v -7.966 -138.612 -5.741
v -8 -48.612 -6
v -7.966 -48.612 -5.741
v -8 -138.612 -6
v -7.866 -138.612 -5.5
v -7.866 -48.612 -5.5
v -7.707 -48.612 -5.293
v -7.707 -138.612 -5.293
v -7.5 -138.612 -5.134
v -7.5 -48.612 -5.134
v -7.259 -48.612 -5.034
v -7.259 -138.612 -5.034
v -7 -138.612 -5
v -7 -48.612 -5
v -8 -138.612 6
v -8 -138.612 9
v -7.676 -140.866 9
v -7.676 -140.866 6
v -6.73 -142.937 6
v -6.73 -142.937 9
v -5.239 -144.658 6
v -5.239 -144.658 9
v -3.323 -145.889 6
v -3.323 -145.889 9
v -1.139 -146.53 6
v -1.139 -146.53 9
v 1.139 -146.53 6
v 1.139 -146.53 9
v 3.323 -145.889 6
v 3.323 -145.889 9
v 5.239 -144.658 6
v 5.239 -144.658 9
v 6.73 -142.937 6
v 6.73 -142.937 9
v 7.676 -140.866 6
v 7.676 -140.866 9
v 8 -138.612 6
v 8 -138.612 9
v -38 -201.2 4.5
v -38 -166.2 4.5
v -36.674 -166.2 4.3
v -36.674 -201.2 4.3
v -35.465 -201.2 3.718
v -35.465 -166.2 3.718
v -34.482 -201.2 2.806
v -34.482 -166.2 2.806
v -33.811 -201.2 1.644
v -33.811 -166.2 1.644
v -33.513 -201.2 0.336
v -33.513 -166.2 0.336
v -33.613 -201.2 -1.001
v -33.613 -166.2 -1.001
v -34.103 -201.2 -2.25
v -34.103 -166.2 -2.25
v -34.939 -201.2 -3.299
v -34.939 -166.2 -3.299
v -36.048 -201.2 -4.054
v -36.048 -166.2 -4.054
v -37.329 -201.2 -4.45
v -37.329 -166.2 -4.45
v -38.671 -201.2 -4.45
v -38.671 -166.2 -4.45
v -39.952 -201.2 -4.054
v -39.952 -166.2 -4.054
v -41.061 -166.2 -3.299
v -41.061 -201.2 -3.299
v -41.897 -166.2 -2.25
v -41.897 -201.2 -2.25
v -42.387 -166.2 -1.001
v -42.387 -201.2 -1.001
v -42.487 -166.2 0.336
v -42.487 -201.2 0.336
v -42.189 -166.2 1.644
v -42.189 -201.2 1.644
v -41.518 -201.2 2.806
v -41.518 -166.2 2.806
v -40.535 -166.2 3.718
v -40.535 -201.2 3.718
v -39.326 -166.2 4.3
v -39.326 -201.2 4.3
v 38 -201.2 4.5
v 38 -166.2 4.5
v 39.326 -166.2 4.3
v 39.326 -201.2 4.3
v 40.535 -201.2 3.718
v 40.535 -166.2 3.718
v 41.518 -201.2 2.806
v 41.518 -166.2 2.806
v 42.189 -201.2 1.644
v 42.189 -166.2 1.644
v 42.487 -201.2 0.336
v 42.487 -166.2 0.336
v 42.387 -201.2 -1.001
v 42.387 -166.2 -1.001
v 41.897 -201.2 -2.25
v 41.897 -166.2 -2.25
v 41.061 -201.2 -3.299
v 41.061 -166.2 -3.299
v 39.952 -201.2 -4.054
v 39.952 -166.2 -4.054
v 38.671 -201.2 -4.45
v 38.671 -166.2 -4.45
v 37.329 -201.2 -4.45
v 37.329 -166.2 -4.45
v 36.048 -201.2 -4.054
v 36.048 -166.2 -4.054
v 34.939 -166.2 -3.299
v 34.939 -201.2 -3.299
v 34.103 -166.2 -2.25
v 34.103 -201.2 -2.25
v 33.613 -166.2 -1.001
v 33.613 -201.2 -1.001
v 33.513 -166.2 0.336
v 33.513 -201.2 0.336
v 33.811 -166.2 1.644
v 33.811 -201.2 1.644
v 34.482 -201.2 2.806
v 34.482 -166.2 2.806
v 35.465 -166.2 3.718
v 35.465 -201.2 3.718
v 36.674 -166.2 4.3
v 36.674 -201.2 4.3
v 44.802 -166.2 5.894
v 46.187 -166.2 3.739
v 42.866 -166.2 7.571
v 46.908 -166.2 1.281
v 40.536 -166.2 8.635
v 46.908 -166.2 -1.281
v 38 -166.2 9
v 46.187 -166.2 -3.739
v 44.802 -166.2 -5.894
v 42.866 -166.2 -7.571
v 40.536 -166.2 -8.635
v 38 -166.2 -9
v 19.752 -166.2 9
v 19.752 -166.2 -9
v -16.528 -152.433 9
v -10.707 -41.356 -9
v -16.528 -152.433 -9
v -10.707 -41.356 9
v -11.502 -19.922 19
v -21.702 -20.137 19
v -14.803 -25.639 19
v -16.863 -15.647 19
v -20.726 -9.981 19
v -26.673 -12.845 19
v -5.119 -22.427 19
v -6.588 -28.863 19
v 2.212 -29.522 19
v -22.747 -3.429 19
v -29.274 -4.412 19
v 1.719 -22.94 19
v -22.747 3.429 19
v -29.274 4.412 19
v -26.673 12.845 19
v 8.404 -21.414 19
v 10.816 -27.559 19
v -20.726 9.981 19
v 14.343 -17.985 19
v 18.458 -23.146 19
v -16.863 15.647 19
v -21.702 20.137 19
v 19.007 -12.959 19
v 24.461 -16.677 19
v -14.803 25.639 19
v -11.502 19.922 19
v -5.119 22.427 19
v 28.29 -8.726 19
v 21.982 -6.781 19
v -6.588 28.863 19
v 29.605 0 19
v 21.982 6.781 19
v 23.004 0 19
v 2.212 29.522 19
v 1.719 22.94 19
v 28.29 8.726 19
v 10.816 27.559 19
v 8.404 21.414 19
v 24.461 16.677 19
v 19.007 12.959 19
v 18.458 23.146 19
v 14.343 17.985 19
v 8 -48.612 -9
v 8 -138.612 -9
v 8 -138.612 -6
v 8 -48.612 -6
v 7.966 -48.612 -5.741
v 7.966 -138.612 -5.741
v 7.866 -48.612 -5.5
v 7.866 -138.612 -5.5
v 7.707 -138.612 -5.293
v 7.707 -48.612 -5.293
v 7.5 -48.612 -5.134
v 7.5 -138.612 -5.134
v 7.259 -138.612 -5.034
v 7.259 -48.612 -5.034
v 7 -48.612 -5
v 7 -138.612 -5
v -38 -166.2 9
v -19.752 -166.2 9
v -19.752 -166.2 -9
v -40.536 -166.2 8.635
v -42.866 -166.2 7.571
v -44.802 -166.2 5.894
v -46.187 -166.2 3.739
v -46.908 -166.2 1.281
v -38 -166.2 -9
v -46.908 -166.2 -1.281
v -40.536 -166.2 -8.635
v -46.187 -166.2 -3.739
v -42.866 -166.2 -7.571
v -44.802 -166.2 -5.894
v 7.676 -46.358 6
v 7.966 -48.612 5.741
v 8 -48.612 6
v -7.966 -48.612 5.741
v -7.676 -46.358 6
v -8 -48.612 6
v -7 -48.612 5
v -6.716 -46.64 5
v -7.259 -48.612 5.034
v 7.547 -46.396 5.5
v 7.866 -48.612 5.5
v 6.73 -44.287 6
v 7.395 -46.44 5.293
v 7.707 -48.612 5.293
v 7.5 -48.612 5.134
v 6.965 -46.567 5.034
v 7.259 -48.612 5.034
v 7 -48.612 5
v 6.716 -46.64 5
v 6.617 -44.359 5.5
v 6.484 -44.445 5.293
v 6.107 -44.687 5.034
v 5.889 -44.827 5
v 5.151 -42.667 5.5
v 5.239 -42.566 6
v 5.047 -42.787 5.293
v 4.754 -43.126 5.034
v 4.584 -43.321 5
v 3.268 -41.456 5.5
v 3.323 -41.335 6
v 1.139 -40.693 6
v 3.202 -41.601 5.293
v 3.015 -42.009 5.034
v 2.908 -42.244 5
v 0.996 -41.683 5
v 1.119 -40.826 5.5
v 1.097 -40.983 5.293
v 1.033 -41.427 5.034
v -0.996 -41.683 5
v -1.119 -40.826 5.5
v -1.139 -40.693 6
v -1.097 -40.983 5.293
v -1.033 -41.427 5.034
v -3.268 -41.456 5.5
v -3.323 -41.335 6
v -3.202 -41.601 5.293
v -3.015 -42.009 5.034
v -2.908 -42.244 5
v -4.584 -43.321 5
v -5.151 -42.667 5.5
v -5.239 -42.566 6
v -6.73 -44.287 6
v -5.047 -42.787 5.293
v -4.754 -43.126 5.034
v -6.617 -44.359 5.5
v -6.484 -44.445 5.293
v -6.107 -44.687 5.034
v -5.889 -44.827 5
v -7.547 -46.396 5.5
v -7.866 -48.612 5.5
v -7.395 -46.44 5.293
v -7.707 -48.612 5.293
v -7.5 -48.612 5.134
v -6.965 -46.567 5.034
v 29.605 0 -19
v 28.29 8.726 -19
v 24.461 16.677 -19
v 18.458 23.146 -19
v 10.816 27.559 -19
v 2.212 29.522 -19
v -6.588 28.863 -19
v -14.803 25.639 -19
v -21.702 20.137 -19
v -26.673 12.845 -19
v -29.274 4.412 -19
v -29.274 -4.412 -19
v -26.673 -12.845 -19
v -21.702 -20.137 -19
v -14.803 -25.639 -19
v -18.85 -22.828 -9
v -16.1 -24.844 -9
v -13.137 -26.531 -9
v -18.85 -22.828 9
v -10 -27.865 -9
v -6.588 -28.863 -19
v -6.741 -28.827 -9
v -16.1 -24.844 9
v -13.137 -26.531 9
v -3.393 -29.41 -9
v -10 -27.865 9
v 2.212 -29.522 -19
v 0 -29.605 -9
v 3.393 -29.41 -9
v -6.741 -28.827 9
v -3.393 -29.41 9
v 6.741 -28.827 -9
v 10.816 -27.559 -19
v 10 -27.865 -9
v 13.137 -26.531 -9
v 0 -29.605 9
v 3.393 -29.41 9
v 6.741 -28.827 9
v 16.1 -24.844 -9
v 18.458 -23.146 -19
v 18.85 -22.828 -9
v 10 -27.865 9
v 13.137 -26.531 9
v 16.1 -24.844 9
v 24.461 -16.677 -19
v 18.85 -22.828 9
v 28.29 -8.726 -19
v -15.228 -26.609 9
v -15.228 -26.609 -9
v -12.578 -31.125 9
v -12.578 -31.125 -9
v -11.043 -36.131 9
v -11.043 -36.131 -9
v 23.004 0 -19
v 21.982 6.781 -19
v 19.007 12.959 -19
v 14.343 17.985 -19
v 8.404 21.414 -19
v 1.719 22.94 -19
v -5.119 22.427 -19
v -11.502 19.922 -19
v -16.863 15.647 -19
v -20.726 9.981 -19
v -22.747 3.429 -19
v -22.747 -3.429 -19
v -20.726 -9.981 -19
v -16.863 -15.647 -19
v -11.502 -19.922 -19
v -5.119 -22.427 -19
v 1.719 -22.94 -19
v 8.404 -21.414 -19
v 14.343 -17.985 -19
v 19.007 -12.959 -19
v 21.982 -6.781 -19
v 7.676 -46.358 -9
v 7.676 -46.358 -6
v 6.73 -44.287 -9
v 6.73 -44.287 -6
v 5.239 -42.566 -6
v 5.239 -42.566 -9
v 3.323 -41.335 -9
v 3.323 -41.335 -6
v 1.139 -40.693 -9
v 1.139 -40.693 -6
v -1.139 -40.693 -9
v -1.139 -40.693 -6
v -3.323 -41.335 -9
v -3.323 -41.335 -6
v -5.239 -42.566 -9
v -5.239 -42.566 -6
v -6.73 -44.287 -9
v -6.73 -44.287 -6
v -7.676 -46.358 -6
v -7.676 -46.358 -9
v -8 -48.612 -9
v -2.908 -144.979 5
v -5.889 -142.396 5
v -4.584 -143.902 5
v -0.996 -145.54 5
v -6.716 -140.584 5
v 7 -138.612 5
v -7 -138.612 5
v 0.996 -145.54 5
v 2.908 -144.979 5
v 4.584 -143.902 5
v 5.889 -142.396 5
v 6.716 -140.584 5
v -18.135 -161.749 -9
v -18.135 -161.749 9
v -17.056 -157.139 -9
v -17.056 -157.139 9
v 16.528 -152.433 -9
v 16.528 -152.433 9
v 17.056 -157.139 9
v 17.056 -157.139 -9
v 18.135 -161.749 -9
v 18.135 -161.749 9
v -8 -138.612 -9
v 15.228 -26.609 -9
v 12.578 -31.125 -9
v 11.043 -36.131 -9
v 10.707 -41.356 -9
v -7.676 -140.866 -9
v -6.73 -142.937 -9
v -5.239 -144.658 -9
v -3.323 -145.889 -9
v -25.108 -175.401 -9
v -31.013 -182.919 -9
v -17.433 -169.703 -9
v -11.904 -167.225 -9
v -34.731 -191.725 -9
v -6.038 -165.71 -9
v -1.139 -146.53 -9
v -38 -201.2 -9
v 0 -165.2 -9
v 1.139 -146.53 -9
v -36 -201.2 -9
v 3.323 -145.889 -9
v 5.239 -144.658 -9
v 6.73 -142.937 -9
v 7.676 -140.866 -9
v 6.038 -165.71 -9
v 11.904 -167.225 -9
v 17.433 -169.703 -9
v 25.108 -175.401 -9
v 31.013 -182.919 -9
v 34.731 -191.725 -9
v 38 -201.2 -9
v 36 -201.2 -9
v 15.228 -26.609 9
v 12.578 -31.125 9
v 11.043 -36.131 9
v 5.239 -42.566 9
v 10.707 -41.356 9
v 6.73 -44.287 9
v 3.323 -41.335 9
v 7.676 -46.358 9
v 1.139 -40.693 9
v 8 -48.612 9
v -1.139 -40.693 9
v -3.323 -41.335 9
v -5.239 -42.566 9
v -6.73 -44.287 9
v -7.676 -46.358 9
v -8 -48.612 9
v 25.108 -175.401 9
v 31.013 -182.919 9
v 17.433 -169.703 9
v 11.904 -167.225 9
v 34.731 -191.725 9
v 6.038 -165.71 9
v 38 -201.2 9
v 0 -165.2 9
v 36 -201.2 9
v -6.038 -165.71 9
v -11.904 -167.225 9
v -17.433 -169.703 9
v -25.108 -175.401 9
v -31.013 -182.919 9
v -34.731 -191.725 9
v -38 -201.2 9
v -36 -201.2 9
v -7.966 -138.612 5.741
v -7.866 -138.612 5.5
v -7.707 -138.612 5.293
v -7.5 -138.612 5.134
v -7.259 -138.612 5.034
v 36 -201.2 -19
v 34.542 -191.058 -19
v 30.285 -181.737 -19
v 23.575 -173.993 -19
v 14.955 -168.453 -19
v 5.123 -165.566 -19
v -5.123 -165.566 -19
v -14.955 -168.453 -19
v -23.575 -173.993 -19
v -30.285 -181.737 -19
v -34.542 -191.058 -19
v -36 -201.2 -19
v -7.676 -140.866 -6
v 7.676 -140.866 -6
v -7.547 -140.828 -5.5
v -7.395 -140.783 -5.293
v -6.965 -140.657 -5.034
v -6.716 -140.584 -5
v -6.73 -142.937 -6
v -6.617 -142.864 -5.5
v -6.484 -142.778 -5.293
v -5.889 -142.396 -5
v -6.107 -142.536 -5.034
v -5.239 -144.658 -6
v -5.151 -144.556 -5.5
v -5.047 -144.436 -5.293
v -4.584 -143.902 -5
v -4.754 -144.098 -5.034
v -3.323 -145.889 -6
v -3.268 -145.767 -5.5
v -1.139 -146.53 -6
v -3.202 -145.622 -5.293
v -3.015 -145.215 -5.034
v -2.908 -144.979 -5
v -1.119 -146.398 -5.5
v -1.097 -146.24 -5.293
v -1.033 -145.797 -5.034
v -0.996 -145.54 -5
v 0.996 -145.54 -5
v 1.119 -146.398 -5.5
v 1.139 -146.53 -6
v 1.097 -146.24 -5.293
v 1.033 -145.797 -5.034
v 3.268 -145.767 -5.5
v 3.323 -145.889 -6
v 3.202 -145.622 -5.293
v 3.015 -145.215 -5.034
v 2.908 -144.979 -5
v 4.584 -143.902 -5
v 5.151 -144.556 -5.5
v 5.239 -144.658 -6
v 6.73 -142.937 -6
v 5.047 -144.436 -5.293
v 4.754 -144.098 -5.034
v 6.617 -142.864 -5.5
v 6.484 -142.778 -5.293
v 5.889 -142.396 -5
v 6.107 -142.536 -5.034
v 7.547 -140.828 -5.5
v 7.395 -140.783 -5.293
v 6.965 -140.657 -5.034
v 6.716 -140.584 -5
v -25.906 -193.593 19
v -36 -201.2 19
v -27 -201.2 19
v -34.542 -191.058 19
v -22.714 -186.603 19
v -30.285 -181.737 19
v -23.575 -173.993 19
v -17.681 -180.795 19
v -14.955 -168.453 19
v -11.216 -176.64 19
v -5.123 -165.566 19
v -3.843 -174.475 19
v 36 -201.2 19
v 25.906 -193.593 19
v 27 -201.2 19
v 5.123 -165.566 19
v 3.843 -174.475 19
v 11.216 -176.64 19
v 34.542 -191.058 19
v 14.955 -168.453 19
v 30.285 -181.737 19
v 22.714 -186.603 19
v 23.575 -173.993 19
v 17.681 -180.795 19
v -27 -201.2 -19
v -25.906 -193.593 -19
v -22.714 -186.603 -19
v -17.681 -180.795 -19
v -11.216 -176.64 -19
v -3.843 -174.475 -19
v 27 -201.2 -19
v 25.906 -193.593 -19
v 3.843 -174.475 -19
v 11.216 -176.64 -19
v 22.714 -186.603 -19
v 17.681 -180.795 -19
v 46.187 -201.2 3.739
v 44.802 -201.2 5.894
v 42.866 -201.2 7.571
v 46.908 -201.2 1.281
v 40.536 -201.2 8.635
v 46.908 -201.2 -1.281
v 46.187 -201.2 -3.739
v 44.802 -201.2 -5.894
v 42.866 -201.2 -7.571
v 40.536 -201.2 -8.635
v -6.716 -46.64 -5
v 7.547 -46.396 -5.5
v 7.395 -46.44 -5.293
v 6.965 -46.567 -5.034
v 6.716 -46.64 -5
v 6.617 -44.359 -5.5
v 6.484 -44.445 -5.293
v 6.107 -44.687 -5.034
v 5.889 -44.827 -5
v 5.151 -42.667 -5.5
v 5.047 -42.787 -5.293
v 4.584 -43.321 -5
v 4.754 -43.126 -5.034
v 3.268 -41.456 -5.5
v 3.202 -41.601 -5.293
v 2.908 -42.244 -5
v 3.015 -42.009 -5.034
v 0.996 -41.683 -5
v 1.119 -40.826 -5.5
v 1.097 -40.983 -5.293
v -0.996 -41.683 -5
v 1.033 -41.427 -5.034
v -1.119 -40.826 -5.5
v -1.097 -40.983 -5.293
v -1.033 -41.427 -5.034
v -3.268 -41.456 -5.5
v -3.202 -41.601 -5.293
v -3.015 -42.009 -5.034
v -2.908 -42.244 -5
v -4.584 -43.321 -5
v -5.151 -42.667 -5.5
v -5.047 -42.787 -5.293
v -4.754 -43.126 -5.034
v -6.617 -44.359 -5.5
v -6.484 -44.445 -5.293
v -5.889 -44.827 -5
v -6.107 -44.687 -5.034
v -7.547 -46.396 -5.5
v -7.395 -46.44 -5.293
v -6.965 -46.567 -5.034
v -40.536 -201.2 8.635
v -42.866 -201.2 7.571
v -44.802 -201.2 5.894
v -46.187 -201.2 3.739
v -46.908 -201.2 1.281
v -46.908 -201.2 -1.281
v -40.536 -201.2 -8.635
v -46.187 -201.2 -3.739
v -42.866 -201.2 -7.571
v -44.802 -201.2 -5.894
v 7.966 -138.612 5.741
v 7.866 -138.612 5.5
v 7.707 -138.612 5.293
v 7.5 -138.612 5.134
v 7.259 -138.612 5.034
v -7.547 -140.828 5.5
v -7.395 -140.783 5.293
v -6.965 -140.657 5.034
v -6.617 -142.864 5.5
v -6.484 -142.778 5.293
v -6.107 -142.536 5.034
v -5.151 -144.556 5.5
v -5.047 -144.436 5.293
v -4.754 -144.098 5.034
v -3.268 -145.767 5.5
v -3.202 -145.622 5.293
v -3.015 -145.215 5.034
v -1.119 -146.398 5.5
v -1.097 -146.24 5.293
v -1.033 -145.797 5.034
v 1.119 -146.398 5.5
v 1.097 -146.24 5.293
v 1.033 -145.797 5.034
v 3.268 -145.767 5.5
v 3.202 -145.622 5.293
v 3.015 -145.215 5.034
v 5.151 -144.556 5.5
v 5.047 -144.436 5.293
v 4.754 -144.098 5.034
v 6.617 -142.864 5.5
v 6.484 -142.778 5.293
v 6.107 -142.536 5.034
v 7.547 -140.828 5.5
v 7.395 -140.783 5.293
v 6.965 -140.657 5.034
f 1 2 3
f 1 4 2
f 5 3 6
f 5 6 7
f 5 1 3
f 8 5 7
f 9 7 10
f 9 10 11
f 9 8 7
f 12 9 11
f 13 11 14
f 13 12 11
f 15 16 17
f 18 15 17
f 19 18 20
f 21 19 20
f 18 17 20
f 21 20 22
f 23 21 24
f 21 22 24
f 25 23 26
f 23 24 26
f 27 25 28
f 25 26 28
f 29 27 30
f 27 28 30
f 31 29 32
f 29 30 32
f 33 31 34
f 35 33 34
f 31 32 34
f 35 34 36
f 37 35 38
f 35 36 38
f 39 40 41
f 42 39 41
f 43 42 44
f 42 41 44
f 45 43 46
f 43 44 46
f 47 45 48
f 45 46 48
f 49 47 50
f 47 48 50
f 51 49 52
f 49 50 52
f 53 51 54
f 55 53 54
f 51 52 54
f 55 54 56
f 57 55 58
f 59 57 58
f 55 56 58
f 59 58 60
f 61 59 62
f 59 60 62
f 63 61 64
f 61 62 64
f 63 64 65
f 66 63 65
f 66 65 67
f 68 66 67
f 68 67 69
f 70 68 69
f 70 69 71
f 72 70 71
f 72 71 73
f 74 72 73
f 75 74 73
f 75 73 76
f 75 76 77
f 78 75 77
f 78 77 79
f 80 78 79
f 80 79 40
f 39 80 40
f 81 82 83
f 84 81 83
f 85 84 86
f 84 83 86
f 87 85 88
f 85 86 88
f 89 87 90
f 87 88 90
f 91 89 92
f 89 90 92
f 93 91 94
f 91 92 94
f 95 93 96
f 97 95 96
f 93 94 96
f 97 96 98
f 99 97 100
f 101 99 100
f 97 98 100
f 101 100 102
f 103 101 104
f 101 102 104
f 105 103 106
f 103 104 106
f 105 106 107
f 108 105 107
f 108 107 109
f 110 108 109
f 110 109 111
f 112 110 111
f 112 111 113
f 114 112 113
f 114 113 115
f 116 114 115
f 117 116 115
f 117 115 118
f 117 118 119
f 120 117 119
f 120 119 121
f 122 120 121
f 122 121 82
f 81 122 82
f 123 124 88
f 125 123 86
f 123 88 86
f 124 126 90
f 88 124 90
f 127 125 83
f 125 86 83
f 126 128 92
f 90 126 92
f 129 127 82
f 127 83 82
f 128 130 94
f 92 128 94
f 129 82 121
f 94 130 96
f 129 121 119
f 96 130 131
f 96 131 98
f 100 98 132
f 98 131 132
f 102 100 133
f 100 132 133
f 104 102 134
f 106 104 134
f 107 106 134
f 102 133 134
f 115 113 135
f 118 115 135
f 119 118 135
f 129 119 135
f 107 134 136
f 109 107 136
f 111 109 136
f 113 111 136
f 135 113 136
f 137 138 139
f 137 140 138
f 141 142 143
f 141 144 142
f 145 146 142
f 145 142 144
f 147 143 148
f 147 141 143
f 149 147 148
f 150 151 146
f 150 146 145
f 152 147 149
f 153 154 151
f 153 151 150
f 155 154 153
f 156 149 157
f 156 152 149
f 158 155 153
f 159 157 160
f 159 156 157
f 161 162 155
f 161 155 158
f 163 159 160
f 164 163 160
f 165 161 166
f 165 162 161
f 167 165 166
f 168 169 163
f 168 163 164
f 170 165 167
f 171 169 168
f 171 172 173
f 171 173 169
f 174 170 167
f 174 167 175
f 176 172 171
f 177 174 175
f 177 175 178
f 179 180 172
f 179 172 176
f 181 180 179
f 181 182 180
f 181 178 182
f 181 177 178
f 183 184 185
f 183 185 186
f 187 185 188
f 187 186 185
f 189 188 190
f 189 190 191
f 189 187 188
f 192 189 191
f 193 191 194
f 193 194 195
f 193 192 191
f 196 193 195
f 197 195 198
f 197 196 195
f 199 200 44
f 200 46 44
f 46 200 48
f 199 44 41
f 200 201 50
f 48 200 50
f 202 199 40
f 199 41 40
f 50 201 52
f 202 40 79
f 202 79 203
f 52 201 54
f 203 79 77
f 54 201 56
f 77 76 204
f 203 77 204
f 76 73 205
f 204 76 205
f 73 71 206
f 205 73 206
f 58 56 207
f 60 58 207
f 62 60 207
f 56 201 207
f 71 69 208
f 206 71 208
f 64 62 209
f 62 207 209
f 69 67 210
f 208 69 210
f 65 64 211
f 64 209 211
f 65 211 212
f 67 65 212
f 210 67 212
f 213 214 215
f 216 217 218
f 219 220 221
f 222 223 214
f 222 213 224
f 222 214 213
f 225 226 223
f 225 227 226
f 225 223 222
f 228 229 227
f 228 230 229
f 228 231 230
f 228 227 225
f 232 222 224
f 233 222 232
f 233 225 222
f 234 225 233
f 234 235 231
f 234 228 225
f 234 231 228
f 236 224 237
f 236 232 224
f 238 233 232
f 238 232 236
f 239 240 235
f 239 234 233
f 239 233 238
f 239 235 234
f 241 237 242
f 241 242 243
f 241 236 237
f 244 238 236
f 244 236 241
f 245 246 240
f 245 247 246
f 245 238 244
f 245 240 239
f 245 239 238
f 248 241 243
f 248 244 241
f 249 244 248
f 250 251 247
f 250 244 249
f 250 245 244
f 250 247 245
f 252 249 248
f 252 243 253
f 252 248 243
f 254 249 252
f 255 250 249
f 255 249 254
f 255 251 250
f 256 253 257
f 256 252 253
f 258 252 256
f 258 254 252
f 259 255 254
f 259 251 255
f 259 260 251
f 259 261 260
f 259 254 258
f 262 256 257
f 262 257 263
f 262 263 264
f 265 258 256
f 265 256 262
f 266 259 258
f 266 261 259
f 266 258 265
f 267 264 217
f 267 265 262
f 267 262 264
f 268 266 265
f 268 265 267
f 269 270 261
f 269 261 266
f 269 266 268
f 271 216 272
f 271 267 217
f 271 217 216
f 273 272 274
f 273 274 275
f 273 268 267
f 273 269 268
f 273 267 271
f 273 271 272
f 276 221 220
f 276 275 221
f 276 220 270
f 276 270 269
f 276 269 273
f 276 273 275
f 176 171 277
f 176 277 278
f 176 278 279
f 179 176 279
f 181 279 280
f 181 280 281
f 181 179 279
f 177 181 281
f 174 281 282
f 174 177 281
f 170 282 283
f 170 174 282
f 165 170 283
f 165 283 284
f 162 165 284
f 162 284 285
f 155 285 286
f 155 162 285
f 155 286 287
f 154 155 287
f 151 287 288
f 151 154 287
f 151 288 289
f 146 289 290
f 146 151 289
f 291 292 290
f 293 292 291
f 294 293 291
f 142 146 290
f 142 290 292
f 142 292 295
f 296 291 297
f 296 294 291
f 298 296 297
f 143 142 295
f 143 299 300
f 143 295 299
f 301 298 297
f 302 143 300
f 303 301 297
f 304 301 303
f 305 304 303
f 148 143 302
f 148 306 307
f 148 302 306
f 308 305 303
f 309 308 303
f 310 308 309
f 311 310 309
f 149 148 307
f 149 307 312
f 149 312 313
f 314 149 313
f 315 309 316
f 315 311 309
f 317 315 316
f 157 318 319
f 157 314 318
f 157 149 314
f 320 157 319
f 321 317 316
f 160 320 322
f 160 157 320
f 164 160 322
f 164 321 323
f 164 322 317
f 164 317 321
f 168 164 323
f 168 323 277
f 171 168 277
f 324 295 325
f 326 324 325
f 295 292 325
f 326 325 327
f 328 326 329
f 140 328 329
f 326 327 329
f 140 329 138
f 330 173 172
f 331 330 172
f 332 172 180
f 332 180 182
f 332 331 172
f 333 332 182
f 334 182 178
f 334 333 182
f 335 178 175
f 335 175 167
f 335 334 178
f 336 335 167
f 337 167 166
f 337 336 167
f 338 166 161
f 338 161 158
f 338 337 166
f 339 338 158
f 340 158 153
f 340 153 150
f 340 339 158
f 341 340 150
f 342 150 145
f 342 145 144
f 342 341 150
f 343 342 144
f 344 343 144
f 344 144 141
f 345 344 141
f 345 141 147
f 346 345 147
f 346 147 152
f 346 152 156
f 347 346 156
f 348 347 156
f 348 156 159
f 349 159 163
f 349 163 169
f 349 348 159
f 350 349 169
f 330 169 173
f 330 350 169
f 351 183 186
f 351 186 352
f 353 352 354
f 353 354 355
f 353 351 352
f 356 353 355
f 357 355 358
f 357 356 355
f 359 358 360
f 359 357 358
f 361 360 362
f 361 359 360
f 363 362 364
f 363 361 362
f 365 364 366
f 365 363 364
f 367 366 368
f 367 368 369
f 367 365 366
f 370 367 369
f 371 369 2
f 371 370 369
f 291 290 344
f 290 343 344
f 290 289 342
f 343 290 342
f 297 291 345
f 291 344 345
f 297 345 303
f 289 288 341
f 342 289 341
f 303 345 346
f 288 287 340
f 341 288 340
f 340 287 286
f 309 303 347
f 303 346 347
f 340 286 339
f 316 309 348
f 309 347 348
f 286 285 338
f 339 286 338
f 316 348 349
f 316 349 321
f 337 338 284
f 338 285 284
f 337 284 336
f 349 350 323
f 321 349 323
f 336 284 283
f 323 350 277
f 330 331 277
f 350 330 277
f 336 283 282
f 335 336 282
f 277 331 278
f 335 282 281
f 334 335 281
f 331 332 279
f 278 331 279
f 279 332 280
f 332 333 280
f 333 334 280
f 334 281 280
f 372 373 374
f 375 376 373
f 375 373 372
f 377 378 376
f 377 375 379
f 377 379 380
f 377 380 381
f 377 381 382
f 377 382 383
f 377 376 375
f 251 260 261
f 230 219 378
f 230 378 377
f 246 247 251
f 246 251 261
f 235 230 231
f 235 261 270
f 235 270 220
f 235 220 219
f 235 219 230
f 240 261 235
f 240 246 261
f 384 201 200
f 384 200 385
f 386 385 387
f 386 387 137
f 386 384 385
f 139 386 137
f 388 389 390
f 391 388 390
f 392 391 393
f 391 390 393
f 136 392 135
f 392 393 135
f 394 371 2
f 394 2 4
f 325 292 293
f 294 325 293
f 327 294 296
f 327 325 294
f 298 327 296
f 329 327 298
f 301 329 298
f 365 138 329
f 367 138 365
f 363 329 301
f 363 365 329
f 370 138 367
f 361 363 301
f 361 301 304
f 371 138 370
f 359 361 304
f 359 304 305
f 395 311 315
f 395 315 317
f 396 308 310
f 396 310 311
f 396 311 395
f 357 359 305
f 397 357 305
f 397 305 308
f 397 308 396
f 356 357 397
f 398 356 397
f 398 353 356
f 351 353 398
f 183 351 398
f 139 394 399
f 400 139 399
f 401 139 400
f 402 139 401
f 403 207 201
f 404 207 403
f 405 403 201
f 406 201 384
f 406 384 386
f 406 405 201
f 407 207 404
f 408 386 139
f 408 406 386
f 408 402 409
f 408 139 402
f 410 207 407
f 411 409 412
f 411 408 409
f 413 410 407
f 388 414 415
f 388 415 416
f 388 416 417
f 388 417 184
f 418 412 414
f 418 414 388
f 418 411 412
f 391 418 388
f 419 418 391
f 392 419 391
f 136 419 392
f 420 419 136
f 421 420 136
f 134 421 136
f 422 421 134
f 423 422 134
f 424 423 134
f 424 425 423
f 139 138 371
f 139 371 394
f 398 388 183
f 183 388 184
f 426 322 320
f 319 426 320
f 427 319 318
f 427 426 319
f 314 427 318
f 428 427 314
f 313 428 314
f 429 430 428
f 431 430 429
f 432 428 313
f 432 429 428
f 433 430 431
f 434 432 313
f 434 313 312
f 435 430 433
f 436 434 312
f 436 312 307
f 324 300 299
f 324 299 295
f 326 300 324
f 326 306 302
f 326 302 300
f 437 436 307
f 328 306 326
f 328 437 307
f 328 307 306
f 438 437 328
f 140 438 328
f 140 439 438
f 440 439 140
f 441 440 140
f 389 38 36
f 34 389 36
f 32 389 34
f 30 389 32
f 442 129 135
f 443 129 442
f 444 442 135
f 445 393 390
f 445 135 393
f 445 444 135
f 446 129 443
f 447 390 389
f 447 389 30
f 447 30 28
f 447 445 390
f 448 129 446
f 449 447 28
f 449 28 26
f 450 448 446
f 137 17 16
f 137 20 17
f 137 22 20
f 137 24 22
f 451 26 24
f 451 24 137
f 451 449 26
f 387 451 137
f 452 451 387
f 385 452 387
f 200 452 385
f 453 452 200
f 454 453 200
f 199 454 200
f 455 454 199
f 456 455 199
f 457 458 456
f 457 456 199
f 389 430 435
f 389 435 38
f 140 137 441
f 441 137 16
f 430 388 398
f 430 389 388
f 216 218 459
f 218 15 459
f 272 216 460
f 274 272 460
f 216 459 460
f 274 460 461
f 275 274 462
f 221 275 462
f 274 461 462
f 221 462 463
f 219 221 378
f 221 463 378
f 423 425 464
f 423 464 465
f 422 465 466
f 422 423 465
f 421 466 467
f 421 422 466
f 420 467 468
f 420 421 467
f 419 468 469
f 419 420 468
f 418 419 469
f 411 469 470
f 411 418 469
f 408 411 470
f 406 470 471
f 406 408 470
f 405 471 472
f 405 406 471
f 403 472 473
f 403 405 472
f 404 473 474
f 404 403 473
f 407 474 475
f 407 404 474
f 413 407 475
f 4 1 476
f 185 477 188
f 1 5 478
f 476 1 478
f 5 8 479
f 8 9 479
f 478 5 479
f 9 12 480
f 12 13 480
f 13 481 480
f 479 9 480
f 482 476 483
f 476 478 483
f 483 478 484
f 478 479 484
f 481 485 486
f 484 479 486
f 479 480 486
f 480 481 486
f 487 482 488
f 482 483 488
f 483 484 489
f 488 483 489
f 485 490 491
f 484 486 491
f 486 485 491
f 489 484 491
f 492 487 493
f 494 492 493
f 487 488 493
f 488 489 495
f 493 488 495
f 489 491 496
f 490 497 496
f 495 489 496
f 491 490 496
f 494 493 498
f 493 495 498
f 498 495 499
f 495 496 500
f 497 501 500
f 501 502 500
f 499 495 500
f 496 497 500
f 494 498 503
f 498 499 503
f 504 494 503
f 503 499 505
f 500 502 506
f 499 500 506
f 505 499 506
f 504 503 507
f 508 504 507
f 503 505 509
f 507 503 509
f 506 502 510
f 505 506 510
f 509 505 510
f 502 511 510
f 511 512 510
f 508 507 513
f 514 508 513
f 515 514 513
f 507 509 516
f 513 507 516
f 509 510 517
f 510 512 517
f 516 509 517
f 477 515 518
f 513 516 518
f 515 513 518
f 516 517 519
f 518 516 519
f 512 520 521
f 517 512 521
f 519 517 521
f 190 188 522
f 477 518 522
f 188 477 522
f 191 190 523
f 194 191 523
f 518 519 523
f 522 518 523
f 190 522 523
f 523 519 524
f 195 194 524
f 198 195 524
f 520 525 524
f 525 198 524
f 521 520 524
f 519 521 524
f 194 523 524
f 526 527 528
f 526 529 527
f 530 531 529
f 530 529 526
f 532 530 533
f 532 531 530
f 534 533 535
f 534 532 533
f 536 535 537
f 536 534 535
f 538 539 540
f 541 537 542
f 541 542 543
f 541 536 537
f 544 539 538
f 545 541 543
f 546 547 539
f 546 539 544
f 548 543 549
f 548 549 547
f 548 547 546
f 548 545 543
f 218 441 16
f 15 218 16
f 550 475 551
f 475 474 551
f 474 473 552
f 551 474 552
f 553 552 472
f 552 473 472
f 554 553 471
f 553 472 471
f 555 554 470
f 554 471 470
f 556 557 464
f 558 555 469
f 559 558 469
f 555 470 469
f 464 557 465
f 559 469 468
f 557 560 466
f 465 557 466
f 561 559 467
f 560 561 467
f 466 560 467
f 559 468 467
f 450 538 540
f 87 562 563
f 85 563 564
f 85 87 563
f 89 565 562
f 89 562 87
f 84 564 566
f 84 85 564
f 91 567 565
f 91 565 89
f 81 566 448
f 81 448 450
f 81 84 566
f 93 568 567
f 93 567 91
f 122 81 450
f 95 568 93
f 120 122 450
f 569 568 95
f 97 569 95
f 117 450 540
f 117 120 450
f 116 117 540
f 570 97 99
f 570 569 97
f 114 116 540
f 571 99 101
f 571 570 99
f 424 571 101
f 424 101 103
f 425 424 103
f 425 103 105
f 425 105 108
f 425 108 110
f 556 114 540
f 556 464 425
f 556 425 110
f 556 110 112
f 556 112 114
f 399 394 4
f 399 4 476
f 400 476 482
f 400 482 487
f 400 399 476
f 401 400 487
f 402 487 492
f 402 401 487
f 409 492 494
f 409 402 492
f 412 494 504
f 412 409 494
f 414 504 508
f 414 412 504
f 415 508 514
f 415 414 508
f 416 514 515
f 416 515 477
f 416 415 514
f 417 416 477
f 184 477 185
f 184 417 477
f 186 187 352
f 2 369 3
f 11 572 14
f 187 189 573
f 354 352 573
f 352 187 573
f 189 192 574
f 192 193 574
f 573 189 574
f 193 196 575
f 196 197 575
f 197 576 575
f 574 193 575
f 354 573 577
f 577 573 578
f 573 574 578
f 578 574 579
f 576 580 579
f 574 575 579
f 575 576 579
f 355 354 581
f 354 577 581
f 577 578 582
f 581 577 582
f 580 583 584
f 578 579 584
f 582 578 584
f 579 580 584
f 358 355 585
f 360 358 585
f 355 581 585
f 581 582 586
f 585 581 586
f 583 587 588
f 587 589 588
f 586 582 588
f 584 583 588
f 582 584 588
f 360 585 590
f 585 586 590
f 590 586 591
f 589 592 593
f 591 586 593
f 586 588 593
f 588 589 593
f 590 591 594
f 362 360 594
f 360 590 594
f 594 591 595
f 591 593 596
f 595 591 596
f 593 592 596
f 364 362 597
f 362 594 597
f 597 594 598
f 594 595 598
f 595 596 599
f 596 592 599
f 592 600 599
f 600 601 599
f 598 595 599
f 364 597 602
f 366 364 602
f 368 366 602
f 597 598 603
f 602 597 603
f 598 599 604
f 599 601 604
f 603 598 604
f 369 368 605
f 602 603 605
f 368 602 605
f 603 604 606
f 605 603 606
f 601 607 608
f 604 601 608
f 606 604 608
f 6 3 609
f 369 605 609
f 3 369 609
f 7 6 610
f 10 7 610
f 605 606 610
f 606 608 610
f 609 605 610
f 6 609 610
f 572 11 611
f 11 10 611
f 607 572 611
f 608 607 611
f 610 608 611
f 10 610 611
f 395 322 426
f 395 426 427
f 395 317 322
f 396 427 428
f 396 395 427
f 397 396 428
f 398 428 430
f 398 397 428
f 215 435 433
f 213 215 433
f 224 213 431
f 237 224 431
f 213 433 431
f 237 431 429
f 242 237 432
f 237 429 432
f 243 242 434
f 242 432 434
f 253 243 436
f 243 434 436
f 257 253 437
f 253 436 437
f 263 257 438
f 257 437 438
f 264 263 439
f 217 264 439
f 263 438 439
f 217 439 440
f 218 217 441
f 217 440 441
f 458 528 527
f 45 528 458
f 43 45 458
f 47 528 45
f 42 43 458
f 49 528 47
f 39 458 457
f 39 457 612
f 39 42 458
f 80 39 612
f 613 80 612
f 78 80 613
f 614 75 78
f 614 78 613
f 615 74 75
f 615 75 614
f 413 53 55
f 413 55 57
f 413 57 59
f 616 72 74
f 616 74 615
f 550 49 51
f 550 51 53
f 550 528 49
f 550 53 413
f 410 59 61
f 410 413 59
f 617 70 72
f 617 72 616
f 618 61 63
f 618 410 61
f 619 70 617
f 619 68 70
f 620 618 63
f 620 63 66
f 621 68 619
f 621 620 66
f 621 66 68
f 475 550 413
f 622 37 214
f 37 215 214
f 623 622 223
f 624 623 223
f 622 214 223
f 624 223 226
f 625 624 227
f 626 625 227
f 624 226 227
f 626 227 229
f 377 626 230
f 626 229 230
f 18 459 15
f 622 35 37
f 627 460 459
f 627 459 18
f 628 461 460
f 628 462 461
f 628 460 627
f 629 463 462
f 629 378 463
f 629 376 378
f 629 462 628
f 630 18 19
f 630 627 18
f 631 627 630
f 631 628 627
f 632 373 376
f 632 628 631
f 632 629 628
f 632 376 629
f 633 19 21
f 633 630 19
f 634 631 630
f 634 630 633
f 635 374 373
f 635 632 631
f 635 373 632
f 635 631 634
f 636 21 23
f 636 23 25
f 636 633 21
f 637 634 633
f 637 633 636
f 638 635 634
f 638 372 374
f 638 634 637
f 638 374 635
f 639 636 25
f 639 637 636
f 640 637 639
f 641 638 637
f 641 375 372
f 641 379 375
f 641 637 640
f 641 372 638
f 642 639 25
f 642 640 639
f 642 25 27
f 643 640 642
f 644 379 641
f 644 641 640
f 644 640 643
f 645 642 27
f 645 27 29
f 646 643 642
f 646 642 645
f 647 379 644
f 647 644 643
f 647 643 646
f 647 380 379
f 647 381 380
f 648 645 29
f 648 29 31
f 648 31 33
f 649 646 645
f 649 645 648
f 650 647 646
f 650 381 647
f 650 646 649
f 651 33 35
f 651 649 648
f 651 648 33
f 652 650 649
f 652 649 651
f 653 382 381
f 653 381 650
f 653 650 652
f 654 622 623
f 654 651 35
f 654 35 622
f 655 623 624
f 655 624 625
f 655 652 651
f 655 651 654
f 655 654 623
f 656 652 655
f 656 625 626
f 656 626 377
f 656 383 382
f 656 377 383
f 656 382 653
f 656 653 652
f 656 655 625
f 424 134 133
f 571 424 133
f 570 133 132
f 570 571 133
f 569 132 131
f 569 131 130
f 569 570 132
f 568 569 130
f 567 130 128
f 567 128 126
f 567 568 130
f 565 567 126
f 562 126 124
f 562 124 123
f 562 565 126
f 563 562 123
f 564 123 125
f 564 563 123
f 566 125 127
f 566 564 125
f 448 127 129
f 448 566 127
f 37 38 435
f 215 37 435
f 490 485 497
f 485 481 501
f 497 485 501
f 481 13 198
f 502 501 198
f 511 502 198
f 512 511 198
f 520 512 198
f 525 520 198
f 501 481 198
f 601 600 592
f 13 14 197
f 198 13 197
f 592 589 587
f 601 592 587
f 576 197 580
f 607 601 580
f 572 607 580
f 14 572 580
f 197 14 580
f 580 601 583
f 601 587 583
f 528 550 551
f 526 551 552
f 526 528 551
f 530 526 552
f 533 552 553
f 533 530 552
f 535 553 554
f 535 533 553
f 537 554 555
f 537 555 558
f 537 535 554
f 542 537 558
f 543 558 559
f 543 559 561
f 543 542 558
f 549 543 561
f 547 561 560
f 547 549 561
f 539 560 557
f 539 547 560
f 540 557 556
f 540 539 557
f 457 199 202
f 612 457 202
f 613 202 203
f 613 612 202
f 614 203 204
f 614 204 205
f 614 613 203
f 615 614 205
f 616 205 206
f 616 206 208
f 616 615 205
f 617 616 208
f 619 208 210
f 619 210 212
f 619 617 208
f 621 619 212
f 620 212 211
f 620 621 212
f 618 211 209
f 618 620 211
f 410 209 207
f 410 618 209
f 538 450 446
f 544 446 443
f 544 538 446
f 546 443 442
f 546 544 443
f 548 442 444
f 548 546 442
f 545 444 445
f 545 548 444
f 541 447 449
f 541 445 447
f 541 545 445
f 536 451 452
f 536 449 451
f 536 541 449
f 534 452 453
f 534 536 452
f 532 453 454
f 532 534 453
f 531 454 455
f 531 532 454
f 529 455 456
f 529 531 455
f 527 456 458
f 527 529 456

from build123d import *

# Parameters (mm, degrees)
SKETCH1_R             = 29.605080475
SKETCH1_R_2           = 23.004044152
BOSS_EXTRUDE1_DEPTH   = 19
BOSS_EXTRUDE1_2_DEPTH = 19
BOSS_EXTRUDE2_DEPTH   = 9
CUT_EXTRUDE1_DEPTH    = 4
FILLET1_R             = 1
FILLET2_R             = 40
FILLET4_R             = 22.5
BOSS_EXTRUDE3_START   = -35
BOSS_EXTRUDE3_DEPTH   = 35
CUT_EXTRUDE2_DEPTH    = 209.505251732
SKETCH6_R             = 4.5
CUT_EXTRUDE3_DEPTH    = 203.261290265


with BuildPart() as part:
    # Sketch1 → Boss-Extrude1 (new, symmetric)
    with BuildSketch(Plane.XY):
        Circle(SKETCH1_R)
        Circle(SKETCH1_R_2, mode=Mode.SUBTRACT)
    extrude(amount=BOSS_EXTRUDE1_DEPTH, both=True)


with BuildPart() as body_2:
    # Sketch1 → Boss-Extrude1 2 (new, symmetric)
    with BuildSketch(Plane.XY):
        with BuildLine():
            Line((-36, -201.2), (-27, -201.2))
            ThreePointArc((-27, -201.2), (0, -174.2), (27, -201.2))
            Line((27, -201.2), (36, -201.2))
            ThreePointArc((36, -201.2), (0, -165.2), (-36, -201.2))
        make_face()
    extrude(amount=BOSS_EXTRUDE1_2_DEPTH, both=True)

    # Sketch1<3> → Boss-Extrude2 (add, symmetric)
    with BuildSketch(Plane.XY):
        with BuildLine():
            ThreePointArc((10, -27.865046024), (5.075128567, -29.166828075), (0, -29.605080475))
            Line((0, -29.605080475), (0, -165.2))
            ThreePointArc((0, -165.2), (9.002752214, -166.343860619), (17.433399222, -169.702752635))
            Line((17.433399222, -169.702752635), (10, -27.865046024))
        make_face()
        with BuildLine():
            Line((0, -165.2), (0, -29.605080475))
            ThreePointArc((0, -29.605080475), (-5.075128567, -29.166828075), (-10, -27.865046024))
            Line((-10, -27.865046024), (-17.433399222, -169.702752635))
            ThreePointArc((-17.433399222, -169.702752635), (-9.002752214, -166.343860619), (0, -165.2))
        make_face()
    extrude(amount=BOSS_EXTRUDE2_DEPTH, both=True)

    # Sketch2 → Cut-Extrude1 (cut)
    with BuildSketch(Plane(origin=(0, 0, -9), x_dir=(-1, 0, 0), z_dir=(0, 0, -1))):
        with BuildLine():
            Line((-8, -138.611669698), (-8, -48.611669698))
            ThreePointArc((-8, -48.611669698), (0, -40.611669698), (8, -48.611669698))
            Line((8, -48.611669698), (8, -138.611669698))
            ThreePointArc((8, -138.611669698), (0, -146.611669698), (-8, -138.611669698))
        make_face()
    cut_extrude1 = extrude(amount=-CUT_EXTRUDE1_DEPTH, mode=Mode.SUBTRACT)

    # Mirror1: Cut-Extrude1 across plane
    add(cut_extrude1.mirror(Plane.XY), mode=Mode.SUBTRACT)

    # Fillet1
    fillet1_edges = [body_2.edges().sort_by_distance(p)[0] for p in [
        (0, -146.611669698, -5),
        (8, -93.611669698, -5),
        (0, -40.611669698, -5),
        (-8, -93.611669698, -5),
        (0, -146.611669698, 5),
        (-8, -93.611669698, 5),
        (0, -40.611669698, 5),
        (8, -93.611669698, 5),
    ]]
    fillet(fillet1_edges, radius=FILLET1_R)

    # Fillet2
    fillet2_edges = [body_2.edges().sort_by_distance(p)[0] for p in [
        (-17.433399222, -169.702752635, 0),
        (17.433399222, -169.702752635, 0),
    ]]
    fillet(fillet2_edges, radius=FILLET2_R)

    # Combine1: union part
    add(part.part)

    # Fillet4
    fillet4_edges = [body_2.edges().sort_by_distance(p)[0] for p in [
        (10, -27.865046024, 0),
        (-10, -27.865046024, 0),
    ]]
    fillet(fillet4_edges, radius=FILLET4_R)

    # Sketch3 → Boss-Extrude3 (add)
    with BuildSketch(Plane(origin=(0, -166.2, 0), x_dir=(1, 0, 0), z_dir=(0, 1, 0)).offset(BOSS_EXTRUDE3_START)):
        with BuildLine():
            Line((-38, 9), (38, 9))
            ThreePointArc((38, 9), (47, 0), (38, -9))
            Line((38, -9), (-38, -9))
            ThreePointArc((-38, -9), (-47, 0), (-38, 9))
        make_face()
    extrude(amount=BOSS_EXTRUDE3_DEPTH)

    # Sketch5 → Cut-Extrude2 (cut, through all)
    with BuildSketch(Plane.XY.offset(9)):
        with BuildLine():
            Line((-27, -201.2), (27, -201.2))
            ThreePointArc((27, -201.2), (0, -174.2), (-27, -201.2))
        make_face()
    extrude(amount=-CUT_EXTRUDE2_DEPTH, mode=Mode.SUBTRACT)

    # Sketch6 → Cut-Extrude3 (cut, through all)
    with BuildSketch(Plane(origin=(0, -166.2, 0), x_dir=(1, 0, 0), z_dir=(0, 1, 0))):
        with Locations(Location((-38, 0, 0), (0, 0, 270))):
            Circle(SKETCH6_R)
        with Locations(Location((38, 0, 0), (0, 0, 270))):
            Circle(SKETCH6_R)
    extrude(amount=-CUT_EXTRUDE3_DEPTH, mode=Mode.SUBTRACT)


solid = body_2.part
